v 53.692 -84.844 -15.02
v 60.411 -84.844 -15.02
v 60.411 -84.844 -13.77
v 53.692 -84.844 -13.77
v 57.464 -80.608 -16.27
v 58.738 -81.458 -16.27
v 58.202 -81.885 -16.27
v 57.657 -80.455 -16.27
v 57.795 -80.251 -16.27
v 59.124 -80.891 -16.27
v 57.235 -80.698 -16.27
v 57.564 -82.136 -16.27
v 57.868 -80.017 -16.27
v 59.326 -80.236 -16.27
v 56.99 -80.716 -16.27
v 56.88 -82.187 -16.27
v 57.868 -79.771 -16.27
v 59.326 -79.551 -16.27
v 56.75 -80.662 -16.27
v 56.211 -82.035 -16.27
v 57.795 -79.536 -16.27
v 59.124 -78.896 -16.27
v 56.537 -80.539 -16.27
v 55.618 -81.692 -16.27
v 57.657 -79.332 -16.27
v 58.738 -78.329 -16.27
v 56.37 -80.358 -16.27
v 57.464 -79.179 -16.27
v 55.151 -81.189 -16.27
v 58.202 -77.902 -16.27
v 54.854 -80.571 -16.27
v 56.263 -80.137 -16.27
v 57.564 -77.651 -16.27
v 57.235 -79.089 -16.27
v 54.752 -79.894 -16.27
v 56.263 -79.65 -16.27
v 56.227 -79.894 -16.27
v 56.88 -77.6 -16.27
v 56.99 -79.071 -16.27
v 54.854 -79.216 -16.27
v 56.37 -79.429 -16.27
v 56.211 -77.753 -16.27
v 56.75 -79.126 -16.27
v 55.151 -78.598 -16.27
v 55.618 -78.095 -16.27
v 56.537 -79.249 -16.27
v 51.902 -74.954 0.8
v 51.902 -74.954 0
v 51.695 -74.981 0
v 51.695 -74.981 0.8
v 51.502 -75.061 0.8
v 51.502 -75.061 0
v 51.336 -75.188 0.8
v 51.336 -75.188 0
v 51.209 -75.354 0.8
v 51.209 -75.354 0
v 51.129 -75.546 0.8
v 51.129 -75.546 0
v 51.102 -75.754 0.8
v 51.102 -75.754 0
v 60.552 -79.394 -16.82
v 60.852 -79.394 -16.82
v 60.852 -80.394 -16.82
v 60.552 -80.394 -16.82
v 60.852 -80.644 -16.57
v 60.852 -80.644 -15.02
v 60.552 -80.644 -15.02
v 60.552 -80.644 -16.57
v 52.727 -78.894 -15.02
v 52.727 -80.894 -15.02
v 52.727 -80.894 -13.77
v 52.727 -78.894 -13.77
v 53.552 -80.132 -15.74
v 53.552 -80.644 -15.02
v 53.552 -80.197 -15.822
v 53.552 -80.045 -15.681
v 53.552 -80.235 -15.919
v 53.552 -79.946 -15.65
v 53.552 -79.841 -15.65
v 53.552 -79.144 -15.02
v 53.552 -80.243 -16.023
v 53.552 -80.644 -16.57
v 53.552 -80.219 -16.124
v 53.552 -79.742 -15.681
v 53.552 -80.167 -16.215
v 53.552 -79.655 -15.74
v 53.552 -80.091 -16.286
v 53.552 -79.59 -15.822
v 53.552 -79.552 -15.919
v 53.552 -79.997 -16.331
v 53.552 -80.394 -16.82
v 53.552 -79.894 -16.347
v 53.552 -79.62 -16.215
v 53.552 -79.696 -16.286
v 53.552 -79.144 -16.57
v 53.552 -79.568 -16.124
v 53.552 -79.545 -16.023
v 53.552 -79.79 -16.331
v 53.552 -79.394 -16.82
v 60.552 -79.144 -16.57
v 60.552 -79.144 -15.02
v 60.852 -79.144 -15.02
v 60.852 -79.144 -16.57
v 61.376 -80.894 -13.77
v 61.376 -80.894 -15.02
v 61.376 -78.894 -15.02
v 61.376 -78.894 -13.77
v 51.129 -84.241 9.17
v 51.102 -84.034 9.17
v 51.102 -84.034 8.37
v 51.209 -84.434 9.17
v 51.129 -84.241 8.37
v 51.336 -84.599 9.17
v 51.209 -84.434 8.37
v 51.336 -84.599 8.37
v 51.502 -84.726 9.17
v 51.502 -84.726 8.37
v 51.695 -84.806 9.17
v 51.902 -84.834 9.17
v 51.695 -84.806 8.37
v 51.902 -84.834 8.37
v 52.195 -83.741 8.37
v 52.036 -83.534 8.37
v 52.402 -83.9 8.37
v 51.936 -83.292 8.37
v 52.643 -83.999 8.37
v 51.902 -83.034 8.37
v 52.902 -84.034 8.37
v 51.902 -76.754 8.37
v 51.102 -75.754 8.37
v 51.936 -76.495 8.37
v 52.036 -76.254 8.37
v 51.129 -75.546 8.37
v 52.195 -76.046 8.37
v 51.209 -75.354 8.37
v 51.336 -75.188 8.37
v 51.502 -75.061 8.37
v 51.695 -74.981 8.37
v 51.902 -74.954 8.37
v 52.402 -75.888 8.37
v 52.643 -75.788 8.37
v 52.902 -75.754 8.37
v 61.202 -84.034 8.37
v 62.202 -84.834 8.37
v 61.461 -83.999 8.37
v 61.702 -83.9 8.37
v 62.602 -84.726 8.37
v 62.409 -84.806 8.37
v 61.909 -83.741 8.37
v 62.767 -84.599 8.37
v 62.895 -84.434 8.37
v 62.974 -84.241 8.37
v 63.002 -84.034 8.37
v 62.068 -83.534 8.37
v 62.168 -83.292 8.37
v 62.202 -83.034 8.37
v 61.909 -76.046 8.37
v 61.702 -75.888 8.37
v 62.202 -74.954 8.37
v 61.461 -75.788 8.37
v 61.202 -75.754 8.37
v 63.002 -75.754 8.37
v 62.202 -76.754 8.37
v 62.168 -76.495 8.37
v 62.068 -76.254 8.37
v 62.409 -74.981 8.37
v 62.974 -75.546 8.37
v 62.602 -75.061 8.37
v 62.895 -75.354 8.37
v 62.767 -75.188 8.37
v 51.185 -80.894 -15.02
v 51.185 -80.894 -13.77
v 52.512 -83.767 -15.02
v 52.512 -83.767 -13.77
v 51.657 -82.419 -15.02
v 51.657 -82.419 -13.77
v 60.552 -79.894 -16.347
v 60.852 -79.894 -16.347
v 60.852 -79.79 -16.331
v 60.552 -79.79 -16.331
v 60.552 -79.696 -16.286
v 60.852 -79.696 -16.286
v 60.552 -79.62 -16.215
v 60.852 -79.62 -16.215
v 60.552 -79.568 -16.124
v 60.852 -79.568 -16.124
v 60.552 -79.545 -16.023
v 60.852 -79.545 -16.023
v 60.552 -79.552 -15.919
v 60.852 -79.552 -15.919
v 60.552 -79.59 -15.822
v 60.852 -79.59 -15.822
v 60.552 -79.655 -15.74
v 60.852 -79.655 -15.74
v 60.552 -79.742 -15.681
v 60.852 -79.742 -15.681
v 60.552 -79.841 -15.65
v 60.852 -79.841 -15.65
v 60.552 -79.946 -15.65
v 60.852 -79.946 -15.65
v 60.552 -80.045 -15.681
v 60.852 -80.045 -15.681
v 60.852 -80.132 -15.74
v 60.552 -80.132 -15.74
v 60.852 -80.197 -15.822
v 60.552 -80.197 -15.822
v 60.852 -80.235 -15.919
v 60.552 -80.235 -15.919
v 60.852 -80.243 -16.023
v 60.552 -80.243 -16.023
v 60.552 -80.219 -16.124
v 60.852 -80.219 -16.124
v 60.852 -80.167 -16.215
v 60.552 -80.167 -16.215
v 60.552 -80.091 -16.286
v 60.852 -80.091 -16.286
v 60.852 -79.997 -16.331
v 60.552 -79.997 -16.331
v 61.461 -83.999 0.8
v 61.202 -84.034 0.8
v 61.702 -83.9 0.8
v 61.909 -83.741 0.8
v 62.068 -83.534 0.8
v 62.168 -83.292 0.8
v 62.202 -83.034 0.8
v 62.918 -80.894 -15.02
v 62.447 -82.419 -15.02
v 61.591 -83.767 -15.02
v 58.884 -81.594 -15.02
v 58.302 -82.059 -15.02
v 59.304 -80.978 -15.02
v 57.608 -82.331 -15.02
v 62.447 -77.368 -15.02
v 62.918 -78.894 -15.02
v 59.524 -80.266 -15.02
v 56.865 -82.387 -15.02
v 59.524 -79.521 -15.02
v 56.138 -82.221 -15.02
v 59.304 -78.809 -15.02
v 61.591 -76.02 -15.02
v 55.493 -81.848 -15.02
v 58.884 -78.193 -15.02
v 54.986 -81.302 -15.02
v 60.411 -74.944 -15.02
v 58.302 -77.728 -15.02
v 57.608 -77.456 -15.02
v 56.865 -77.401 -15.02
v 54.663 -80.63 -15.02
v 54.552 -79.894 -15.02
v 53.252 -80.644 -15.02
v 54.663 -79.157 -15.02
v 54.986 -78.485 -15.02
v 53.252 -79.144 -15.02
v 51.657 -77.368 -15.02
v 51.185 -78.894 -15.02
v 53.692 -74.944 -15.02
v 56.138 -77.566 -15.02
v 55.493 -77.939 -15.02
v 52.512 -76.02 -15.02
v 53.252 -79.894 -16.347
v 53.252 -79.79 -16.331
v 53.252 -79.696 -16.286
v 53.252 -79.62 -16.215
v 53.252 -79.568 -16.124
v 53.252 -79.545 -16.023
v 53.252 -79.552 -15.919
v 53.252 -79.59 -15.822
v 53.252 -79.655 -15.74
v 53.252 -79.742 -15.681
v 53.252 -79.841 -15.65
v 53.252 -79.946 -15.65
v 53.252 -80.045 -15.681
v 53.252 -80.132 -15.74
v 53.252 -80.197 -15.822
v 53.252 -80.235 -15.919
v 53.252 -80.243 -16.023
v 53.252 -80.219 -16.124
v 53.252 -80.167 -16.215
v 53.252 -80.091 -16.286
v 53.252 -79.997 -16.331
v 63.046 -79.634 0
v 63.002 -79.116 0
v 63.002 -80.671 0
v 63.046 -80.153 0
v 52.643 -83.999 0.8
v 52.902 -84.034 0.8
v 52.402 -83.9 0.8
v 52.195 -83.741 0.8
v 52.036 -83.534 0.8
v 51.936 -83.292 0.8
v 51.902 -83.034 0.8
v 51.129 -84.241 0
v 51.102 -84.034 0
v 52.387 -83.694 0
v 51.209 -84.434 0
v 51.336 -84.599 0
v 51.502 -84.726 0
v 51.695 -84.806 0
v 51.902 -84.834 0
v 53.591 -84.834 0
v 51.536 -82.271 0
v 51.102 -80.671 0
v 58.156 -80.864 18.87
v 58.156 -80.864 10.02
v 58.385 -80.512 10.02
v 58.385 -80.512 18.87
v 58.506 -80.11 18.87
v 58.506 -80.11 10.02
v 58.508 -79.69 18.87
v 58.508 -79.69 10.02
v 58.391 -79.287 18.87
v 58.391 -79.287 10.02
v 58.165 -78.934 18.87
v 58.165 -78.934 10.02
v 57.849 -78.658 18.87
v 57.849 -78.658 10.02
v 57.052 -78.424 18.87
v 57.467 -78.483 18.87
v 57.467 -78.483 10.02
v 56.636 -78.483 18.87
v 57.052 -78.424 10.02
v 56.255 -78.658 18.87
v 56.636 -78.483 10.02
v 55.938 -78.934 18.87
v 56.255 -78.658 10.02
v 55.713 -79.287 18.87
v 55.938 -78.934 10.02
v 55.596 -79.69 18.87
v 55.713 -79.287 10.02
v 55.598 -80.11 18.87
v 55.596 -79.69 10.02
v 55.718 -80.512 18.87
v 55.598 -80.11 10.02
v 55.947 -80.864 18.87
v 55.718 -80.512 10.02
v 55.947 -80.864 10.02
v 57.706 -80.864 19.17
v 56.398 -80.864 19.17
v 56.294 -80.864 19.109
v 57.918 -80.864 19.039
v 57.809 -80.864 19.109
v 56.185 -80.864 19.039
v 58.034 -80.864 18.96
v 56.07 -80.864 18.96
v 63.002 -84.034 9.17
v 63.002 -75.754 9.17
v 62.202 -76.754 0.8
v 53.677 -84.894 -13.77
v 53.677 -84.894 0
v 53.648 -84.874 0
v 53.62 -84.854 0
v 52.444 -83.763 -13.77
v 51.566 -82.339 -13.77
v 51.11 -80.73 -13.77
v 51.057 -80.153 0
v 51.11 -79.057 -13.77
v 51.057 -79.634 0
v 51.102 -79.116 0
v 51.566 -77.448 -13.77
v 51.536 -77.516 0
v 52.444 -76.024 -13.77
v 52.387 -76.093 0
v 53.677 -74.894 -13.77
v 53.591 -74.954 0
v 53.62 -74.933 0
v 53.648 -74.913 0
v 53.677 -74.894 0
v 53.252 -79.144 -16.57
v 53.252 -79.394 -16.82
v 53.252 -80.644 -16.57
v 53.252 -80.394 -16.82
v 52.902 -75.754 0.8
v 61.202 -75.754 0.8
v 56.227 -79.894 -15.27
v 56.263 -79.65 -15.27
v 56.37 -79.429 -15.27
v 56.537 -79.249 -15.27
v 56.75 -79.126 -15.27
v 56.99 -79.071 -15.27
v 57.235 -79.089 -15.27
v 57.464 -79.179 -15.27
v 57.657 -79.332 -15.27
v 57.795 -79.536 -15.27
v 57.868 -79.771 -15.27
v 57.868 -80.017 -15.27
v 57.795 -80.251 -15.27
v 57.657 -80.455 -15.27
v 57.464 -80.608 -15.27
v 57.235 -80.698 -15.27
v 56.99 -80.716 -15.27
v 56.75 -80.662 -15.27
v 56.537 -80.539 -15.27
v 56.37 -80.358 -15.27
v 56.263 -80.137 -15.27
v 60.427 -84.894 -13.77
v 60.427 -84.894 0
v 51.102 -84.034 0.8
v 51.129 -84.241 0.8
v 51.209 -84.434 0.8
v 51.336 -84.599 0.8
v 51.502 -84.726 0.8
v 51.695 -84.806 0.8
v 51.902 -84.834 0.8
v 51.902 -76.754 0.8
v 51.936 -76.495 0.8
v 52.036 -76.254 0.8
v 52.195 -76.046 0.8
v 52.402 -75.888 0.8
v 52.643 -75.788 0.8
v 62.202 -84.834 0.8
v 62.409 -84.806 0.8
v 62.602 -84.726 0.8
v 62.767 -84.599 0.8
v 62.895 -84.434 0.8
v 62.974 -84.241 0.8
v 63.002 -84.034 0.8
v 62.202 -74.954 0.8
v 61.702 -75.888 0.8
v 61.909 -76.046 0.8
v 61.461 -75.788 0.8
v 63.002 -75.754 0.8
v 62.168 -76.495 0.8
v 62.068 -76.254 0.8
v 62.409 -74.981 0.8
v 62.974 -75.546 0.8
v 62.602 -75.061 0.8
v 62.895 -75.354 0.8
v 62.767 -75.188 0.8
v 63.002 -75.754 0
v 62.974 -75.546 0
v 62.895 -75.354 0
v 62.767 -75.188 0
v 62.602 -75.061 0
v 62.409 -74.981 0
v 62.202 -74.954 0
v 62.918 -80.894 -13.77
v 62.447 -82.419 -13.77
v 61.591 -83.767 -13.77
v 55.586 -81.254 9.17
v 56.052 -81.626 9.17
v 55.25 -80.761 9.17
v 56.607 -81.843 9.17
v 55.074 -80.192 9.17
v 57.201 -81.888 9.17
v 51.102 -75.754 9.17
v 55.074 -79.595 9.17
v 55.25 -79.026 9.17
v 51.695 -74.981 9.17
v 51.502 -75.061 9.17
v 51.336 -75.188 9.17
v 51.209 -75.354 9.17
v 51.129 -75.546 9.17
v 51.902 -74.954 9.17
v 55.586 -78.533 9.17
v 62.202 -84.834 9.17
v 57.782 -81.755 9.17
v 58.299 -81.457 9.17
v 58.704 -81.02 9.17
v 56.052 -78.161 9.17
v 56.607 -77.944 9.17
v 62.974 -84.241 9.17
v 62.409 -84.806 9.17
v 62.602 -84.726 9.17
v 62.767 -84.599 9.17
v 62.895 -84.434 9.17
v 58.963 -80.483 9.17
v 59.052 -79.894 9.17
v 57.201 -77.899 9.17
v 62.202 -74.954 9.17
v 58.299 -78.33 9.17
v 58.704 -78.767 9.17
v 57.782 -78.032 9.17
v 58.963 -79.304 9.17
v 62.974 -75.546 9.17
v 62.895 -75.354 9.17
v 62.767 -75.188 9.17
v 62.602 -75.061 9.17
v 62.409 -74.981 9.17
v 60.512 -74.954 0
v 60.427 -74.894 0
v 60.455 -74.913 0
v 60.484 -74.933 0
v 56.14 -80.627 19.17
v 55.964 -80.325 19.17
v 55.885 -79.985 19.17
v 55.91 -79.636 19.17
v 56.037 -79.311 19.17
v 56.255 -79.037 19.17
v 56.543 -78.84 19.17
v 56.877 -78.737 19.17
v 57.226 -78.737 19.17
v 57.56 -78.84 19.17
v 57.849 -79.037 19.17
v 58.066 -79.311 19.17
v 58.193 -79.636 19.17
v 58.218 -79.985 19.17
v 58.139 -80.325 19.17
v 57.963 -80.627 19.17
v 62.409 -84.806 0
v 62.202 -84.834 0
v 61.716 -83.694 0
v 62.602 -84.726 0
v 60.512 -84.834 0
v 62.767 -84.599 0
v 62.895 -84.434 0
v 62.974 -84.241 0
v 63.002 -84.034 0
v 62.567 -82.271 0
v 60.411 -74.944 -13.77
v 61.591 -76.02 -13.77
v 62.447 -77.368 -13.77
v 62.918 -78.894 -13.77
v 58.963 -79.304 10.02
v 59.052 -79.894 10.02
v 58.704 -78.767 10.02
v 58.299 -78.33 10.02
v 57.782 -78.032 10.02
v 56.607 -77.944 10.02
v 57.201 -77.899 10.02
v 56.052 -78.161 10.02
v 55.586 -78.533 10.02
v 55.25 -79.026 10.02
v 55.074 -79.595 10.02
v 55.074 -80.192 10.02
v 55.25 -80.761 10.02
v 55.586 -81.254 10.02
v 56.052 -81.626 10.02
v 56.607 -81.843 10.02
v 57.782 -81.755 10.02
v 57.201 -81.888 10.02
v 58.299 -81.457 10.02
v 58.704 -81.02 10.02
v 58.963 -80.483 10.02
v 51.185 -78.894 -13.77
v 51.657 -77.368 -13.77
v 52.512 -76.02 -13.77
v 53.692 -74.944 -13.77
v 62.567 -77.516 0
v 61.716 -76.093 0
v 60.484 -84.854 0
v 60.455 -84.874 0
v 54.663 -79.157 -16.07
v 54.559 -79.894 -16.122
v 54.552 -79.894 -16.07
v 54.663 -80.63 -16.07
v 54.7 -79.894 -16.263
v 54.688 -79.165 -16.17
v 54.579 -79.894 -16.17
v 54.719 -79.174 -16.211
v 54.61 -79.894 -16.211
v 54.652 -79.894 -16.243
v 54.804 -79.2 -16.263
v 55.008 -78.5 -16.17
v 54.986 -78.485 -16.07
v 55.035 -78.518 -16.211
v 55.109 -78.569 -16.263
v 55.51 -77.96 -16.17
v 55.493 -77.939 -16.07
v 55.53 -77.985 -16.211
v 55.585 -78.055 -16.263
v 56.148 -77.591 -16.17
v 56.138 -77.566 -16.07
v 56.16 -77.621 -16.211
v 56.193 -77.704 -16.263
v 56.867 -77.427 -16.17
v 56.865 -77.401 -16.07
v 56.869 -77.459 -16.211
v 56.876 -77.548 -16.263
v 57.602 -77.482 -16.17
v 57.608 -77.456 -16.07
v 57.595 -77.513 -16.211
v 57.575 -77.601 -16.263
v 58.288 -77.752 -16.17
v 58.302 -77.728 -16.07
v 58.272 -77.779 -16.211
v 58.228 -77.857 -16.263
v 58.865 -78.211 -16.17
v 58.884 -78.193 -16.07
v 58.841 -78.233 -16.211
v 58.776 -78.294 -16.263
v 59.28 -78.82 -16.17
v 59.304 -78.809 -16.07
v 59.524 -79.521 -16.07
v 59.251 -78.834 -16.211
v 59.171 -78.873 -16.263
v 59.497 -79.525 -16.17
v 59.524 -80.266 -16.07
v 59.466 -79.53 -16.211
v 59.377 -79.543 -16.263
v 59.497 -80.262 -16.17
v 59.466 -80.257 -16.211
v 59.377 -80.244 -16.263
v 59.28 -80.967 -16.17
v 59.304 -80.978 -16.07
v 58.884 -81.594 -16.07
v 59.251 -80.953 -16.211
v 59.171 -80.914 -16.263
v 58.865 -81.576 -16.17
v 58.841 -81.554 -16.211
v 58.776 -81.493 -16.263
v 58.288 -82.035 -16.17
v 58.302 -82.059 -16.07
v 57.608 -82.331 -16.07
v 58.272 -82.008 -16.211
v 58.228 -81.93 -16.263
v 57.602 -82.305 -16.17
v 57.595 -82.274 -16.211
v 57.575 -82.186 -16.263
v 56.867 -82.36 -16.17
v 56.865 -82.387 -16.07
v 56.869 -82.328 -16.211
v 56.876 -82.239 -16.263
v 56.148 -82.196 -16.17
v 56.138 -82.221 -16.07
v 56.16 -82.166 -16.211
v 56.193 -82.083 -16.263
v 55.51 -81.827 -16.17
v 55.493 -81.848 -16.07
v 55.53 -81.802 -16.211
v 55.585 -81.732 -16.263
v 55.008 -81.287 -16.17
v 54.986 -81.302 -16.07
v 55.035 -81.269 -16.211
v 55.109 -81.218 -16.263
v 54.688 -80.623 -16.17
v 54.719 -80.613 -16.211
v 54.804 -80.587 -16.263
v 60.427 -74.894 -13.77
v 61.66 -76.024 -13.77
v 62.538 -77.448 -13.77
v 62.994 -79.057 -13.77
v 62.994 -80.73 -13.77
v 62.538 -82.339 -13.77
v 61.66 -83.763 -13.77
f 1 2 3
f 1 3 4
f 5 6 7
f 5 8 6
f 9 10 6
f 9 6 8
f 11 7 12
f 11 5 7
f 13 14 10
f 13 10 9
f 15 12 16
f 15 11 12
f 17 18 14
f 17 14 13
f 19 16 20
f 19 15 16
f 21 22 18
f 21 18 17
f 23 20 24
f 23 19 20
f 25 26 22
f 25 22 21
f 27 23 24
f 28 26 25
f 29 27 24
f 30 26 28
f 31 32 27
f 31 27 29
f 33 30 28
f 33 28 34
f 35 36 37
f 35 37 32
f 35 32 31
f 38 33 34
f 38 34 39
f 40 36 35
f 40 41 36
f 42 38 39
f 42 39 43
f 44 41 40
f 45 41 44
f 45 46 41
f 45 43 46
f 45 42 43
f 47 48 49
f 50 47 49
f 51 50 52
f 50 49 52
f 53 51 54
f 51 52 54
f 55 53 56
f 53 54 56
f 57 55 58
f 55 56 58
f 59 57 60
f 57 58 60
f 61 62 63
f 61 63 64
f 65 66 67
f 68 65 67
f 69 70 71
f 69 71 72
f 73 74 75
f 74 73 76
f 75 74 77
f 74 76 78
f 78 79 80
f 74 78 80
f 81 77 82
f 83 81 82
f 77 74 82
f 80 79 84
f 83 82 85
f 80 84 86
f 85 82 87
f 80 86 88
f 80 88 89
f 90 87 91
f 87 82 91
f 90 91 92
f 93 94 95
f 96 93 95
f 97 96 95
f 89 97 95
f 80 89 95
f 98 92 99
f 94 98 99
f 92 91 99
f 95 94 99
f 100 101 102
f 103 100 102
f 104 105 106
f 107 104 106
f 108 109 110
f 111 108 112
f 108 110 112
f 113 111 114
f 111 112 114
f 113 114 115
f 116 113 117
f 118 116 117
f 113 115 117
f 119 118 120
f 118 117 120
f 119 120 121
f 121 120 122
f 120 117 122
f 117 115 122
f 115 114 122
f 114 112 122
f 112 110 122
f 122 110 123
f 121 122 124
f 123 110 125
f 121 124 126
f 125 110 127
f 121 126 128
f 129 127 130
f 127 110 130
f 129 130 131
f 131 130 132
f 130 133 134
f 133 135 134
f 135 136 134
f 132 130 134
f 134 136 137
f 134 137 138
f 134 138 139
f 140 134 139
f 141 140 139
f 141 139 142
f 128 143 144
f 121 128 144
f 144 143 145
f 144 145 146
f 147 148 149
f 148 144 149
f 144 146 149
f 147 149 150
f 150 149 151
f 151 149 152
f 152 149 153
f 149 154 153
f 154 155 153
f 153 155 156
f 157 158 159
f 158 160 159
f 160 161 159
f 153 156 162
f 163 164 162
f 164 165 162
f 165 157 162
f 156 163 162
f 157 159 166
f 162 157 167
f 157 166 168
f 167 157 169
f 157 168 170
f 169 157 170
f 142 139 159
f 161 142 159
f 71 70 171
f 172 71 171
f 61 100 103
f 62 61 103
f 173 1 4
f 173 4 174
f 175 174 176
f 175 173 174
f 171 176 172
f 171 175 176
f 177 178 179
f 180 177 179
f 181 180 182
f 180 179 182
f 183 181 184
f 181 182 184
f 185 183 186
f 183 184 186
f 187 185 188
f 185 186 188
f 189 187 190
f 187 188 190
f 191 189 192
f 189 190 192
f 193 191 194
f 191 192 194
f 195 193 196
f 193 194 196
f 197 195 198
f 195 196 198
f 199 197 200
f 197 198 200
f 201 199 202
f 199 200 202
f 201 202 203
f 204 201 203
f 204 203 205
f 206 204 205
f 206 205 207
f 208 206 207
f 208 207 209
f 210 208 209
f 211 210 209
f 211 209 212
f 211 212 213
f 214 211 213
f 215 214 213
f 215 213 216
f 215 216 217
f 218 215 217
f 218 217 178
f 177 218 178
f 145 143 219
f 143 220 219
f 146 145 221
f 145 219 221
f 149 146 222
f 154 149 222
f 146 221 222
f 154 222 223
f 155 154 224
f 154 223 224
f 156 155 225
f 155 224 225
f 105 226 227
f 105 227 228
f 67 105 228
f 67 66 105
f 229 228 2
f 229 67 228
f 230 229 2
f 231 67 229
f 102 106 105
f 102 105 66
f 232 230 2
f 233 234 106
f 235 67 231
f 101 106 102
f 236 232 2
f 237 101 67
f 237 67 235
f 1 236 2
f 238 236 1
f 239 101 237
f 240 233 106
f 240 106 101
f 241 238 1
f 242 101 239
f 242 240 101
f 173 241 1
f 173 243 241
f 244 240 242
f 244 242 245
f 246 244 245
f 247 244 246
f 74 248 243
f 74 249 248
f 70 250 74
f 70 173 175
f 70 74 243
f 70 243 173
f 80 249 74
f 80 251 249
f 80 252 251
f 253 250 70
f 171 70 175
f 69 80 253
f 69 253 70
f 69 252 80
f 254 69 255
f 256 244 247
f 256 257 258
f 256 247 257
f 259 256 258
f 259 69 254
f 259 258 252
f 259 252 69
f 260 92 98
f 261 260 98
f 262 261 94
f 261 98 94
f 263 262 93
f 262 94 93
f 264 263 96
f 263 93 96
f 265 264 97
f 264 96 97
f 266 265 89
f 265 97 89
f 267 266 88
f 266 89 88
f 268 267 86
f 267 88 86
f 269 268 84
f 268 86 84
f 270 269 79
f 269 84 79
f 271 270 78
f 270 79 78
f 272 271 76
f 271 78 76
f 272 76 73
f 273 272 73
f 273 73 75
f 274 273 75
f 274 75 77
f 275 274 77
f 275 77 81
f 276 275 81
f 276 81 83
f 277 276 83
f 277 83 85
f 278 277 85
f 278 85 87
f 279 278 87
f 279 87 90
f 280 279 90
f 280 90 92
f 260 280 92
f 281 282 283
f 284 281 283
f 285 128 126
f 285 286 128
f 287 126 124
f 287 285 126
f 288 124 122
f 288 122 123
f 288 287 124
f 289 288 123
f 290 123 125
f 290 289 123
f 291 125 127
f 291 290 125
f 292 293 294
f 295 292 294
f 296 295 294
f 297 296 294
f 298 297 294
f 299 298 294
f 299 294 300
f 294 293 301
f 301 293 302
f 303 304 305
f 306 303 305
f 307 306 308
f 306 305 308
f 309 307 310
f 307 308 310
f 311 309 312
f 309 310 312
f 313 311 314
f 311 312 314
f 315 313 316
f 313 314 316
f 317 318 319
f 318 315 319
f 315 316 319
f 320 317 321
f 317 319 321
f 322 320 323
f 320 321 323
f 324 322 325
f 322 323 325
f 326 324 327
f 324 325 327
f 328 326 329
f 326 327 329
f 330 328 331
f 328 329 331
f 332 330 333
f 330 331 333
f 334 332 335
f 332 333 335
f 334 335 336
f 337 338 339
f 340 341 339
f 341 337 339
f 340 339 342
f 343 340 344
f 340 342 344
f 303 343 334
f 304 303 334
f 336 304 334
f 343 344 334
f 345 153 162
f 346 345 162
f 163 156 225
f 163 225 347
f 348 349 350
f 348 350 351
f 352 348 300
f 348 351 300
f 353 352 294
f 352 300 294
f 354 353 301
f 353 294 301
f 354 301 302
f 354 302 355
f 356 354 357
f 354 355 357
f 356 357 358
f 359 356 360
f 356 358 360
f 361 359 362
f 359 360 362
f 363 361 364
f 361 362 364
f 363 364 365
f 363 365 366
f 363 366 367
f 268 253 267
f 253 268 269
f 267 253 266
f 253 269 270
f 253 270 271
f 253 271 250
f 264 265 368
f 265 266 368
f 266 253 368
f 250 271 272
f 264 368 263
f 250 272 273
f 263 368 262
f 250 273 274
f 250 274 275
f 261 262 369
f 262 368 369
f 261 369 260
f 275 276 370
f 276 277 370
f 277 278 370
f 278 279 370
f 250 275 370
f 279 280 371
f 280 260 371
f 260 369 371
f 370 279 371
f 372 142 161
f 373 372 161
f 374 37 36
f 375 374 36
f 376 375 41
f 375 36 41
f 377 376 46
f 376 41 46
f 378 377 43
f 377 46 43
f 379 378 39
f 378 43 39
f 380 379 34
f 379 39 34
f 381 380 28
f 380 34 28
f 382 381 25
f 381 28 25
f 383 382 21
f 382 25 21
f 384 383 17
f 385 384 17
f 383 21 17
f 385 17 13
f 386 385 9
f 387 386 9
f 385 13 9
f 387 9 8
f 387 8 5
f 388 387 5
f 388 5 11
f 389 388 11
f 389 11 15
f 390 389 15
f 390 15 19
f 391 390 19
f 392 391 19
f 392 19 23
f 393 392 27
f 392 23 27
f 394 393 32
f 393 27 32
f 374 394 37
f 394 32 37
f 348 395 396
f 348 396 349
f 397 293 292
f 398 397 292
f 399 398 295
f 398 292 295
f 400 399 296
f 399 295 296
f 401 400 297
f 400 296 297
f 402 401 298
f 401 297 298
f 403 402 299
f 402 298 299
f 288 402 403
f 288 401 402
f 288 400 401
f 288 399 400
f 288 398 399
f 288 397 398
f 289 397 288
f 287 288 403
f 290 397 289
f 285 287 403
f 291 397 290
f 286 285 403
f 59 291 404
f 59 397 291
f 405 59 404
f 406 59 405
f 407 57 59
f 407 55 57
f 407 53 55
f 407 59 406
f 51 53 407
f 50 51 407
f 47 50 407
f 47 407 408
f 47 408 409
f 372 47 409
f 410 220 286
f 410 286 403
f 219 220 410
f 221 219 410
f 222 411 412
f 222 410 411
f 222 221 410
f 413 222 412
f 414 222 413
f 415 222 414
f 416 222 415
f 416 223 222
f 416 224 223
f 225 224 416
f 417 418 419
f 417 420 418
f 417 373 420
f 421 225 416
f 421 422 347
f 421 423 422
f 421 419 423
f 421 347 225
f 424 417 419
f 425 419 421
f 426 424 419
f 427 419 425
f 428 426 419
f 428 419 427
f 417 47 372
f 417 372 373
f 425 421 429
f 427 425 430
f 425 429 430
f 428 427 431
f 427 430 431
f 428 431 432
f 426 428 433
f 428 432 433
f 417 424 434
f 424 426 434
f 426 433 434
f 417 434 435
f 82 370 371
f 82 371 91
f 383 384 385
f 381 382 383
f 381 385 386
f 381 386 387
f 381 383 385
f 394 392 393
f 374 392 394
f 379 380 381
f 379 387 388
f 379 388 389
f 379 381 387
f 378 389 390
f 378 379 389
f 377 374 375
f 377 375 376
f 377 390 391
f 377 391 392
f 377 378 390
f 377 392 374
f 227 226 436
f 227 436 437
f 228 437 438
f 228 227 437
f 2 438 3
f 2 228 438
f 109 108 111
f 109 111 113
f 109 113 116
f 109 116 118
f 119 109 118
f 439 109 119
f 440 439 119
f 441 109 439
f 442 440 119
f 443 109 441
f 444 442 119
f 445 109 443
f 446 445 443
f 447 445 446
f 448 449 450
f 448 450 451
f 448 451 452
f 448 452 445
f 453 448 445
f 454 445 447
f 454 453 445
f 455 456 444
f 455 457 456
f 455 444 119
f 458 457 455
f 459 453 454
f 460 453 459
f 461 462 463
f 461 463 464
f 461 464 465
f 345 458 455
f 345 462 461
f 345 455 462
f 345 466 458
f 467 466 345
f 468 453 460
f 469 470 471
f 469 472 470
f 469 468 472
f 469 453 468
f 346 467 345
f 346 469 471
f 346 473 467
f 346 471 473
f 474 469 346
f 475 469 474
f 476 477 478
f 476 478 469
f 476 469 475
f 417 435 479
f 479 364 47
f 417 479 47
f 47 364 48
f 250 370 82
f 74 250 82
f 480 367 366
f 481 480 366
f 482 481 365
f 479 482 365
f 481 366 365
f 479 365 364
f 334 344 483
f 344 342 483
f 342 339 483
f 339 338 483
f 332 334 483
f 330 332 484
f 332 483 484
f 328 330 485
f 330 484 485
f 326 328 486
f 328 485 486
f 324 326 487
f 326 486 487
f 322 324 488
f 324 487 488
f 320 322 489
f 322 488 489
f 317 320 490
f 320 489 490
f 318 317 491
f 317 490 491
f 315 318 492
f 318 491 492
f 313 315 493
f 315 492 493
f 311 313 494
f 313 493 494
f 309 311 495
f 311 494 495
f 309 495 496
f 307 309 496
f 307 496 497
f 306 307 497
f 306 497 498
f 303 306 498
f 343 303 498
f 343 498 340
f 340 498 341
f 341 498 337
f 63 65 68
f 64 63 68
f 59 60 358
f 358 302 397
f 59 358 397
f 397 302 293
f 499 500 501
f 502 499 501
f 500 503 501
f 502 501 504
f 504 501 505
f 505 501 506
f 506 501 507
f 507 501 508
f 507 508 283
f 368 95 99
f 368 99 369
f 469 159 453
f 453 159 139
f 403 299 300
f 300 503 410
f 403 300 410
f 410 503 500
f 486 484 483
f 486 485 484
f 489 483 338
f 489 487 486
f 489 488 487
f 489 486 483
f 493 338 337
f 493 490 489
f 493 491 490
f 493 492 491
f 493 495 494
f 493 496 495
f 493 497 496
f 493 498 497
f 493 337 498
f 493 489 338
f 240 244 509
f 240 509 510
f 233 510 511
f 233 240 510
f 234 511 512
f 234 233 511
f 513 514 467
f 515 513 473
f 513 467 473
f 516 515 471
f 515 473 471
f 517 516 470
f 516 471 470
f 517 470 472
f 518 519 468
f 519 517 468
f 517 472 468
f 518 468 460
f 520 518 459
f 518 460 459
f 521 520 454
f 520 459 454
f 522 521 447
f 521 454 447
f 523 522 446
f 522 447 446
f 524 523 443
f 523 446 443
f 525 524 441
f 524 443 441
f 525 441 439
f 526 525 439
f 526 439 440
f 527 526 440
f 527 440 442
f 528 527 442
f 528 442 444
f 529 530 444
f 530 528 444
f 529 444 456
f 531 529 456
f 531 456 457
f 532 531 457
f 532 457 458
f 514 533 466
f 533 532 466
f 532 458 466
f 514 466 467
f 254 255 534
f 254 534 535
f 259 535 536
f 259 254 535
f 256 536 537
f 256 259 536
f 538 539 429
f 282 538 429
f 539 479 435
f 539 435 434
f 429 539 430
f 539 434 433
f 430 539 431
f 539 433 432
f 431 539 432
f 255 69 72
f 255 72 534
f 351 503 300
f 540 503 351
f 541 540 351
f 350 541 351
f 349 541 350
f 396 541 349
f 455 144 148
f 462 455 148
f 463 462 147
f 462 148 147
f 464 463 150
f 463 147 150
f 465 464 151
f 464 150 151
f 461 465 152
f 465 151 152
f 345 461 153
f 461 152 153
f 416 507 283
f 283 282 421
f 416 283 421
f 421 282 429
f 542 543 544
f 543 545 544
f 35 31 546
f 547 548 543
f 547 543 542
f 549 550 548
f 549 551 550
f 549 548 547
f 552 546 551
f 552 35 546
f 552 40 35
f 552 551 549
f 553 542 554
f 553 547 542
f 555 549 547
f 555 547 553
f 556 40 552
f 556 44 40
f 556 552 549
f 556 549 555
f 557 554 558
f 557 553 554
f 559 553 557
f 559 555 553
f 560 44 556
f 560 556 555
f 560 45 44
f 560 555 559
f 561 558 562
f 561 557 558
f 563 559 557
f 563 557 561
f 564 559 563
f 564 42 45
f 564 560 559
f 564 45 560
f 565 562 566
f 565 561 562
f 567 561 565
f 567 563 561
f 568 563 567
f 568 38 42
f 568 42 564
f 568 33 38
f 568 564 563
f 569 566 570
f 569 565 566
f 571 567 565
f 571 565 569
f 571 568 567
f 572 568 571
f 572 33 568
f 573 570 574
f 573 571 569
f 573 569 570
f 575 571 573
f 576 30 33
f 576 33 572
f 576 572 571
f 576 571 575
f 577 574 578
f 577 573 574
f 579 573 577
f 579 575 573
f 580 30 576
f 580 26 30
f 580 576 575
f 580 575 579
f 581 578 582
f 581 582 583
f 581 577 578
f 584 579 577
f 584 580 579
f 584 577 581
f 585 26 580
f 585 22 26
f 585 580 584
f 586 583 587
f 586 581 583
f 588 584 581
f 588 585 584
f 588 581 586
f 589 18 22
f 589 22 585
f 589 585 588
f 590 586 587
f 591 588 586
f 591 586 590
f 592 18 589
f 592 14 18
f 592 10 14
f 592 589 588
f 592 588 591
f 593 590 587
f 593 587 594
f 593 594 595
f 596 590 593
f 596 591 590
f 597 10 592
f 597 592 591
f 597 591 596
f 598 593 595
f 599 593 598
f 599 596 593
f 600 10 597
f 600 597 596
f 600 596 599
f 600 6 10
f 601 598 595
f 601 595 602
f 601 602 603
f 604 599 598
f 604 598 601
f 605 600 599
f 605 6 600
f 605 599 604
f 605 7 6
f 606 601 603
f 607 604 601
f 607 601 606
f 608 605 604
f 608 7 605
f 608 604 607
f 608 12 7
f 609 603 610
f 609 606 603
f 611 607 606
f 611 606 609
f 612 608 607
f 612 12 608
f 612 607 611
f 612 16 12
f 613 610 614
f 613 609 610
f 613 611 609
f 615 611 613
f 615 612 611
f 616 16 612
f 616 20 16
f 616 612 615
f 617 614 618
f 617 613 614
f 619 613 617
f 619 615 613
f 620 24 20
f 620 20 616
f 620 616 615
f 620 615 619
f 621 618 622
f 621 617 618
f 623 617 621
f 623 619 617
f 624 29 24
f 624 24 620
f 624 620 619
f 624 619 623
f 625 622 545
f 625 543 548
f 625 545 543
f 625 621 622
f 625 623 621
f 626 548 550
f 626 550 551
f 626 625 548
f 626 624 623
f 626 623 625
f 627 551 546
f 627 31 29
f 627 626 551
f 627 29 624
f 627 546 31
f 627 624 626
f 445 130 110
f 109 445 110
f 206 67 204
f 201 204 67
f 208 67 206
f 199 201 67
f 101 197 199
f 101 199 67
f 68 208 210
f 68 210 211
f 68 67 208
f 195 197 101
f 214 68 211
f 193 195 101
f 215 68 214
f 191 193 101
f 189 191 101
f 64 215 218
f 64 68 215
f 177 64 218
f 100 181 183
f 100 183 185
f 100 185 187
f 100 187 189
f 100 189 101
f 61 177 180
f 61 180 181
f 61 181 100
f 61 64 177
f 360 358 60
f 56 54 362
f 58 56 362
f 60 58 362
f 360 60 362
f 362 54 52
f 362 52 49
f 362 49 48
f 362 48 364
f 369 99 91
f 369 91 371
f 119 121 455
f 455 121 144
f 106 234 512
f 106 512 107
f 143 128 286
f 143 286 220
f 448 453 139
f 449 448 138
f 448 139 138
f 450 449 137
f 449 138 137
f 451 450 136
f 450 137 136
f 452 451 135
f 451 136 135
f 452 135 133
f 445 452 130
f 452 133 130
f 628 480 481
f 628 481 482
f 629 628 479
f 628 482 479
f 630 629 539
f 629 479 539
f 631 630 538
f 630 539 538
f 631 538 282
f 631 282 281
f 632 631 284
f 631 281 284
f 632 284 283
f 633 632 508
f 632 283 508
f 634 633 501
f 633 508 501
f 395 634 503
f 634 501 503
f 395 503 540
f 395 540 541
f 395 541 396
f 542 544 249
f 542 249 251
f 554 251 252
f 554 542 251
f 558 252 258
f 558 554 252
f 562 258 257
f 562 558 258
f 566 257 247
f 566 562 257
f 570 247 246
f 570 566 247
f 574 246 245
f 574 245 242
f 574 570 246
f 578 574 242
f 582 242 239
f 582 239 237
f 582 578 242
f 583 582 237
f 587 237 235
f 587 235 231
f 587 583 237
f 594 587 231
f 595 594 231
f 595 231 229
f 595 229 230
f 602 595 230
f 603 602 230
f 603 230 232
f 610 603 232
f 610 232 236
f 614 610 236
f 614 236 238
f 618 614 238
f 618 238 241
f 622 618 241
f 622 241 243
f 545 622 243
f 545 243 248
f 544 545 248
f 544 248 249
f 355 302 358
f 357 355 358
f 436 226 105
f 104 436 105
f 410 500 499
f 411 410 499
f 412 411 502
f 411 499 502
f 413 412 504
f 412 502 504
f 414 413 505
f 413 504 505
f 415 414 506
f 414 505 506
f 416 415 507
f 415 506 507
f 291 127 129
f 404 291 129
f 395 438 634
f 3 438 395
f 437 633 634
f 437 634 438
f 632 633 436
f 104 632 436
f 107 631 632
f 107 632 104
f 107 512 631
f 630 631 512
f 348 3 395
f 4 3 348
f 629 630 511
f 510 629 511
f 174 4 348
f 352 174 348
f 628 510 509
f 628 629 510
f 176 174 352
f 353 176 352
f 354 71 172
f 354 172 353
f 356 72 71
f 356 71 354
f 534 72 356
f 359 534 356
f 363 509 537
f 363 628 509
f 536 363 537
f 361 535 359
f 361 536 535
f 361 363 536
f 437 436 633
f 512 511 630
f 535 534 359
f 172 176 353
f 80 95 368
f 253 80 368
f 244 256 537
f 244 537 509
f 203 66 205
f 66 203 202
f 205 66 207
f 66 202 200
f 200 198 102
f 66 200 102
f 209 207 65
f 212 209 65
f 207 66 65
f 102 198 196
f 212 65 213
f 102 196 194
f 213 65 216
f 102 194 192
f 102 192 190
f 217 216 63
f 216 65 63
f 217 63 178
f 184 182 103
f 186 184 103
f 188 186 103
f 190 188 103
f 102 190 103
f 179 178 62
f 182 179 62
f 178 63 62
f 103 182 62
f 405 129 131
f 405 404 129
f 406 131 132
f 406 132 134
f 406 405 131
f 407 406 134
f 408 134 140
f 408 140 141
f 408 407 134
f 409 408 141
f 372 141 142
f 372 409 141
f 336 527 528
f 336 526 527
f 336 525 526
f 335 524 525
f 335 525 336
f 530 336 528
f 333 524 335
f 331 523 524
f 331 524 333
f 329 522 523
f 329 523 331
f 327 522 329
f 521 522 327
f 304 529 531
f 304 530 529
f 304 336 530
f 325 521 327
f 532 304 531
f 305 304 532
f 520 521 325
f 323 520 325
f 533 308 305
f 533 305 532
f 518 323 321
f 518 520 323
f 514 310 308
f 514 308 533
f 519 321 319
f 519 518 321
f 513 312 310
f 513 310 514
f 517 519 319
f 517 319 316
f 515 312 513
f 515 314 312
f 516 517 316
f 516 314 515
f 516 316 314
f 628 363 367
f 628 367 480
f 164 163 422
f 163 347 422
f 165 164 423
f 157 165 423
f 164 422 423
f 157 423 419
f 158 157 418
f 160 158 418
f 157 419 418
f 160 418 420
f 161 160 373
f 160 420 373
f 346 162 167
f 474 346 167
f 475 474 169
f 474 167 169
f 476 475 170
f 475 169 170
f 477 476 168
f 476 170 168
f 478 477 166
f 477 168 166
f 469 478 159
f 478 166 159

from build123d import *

# Parameters (mm, degrees)
BOSS_EXTRUDE1_DEPTH = 16.82
BOSS_EXTRUDE2_DEPTH = 9.17
SKETCH3_R           = 2
BOSS_EXTRUDE3_DEPTH = 0.85
SKETCH4_R           = 1.47
BOSS_EXTRUDE4_DEPTH = 9.15
CUT_EXTRUDE1_DEPTH  = 9.15
SKETCH7_R           = 7.076677912
SKETCH7_R_2         = 2.5
CUT_EXTRUDE2_DEPTH  = 1.8
SKETCH8_R           = 2.5
CUT_EXTRUDE3_DEPTH  = 0.55
SKETCH9_W           = 14.3
SKETCH9_H           = 12.28
SKETCH9_W_2         = 10.3
SKETCH9_H_2         = 8.28
CUT_EXTRUDE4_DEPTH  = 7.57
FILLET1_R           = 1
CHAMFER2_SIZE       = 0.25
SKETCH10_R          = 0.35
CUT_EXTRUDE5_DEPTH  = 0.8
SKETCH11_R          = 0.35
CUT_EXTRUDE6_DEPTH  = 0.8
FILLET2_R           = 0.2
SKETCH12_R          = 0.825
CUT_EXTRUDE7_DEPTH  = 1
CUT_EXTRUDE8_DEPTH  = 1.25
SKETCH14_W          = 1.939968983
SKETCH14_H          = 2
CUT_EXTRUDE9_DEPTH  = 1.25
CHAMFER3_SIZE       = 0.3


with BuildPart() as part:
    # Sketch1 → Boss-Extrude1 (new body)
    with BuildSketch(Plane.XY):
        with BuildLine():
            Line((53.676749567, -74.893540286), (60.426749567, -74.893540286))
            ThreePointArc((60.426749567, -74.893540286), (63.051749567, -79.893540286), (60.426749567, -84.893540286))
            Line((60.426749567, -84.893540286), (53.676749567, -84.893540286))
            ThreePointArc((53.676749567, -84.893540286), (51.051749567, -79.893540286), (53.676749567, -74.893540286))
        make_face()
    extrude(amount=-BOSS_EXTRUDE1_DEPTH)

    # Sketch2 → Boss-Extrude2 (add)
    with BuildSketch(Plane.XY):
        with BuildLine():
            Line((63.001749567, -84.033540286), (63.001749567, -75.753540286))
            ThreePointArc((63.001749567, -75.753540286), (62.767434992, -75.187854862), (62.201749567, -74.953540286))
            Line((62.201749567, -74.953540286), (51.901749567, -74.953540286))
            ThreePointArc((51.901749567, -74.953540286), (51.336064142, -75.187854862), (51.101749567, -75.753540286))
            Line((51.101749567, -75.753540286), (51.101749567, -84.033540286))
            ThreePointArc((51.101749567, -84.033540286), (51.336064142, -84.599225711), (51.901749567, -84.833540286))
            Line((51.901749567, -84.833540286), (62.201749567, -84.833540286))
            ThreePointArc((62.201749567, -84.833540286), (62.767434992, -84.599225711), (63.001749567, -84.033540286))
        make_face()
    extrude(amount=BOSS_EXTRUDE2_DEPTH)

    # Sketch3 → Boss-Extrude3 (add)
    with BuildSketch(Plane.XY.offset(9.17)):
        with Locations((57.051749567, -79.893540286)):
            Circle(SKETCH3_R)
    extrude(amount=BOSS_EXTRUDE3_DEPTH)

    # Sketch4 → Boss-Extrude4 (add)
    with BuildSketch(Plane.XY.offset(10.02)):
        with Locations((57.051749567, -79.893540286)):
            Circle(SKETCH4_R)
    extrude(amount=BOSS_EXTRUDE4_DEPTH)

    # Sketch5 → Cut-Extrude1 (cut)
    with BuildSketch(Plane.XY.offset(19.17)):
        Polygon((57.051749567, -80.863540286), (58.479364881, -80.863540286), (58.479364881, -81.63553805), (55.371975477, -81.63553805), (55.371975477, -80.863540286), align=None)
    extrude(amount=-CUT_EXTRUDE1_DEPTH, mode=Mode.SUBTRACT)

    # Sketch7 → Cut-Extrude2 (cut)
    with BuildSketch(Plane(origin=(0, 0, -16.82), x_dir=(-1, 0, 0), z_dir=(0, 0, -1))):
        with Locations((-57.051749567, -79.893540286)):
            Circle(SKETCH7_R)
        with Locations((-57.051749567, -79.893540286)):
            Circle(SKETCH7_R_2, mode=Mode.SUBTRACT)
        Polygon((-60.551749567, -79.143540286), (-60.851749567, -79.143540286), (-60.851749567, -79.893540286), (-60.851749567, -80.643540286), (-60.551749567, -80.643540286), align=None, mode=Mode.SUBTRACT)
        Polygon((-53.251749567, -79.143540286), (-53.251749567, -79.893540286), (-53.251749567, -80.643540286), (-53.551749567, -80.643540286), (-53.551749567, -79.143540286), align=None, mode=Mode.SUBTRACT)
    extrude(amount=-CUT_EXTRUDE2_DEPTH, mode=Mode.SUBTRACT)

    # Sketch8 → Cut-Extrude3 (cut)
    with BuildSketch(Plane(origin=(0, 0, -16.82), x_dir=(-1, 0, 0), z_dir=(0, 0, -1))):
        with Locations((-57.051749567, -79.893540286)):
            Circle(SKETCH8_R)
    extrude(amount=-CUT_EXTRUDE3_DEPTH, mode=Mode.SUBTRACT)

    # Sketch9 → Cut-Extrude4 (cut)
    with BuildSketch(Plane.XY.offset(8.37)):
        with Locations((57.051749567, -79.893540286)):
            Rectangle(SKETCH9_W, SKETCH9_H)
        with Locations((57.051749567, -79.893540286)):
            Rectangle(SKETCH9_W_2, SKETCH9_H_2, mode=Mode.SUBTRACT)
    extrude(amount=-CUT_EXTRUDE4_DEPTH, mode=Mode.SUBTRACT)

    # Fillet1
    fillet1_edges = [part.edges().sort_by_distance(p)[0] for p in [
        (51.901749567, -75.753540286, 4.585),
        (51.901749567, -84.033540286, 4.585),
        (62.201749567, -84.033540286, 4.585),
        (62.201749567, -75.753540286, 4.585),
    ]]
    fillet(fillet1_edges, radius=FILLET1_R)

    # Chamfer2
    chamfer2_edges = [part.edges().sort_by_distance(p)[0] for p in [
        (60.701749567, -80.643540286, -16.82),
        (60.701749567, -79.143540286, -16.82),
        (53.401749567, -80.643540286, -16.82),
        (53.401749567, -79.143540286, -16.82),
    ]]
    chamfer(chamfer2_edges, length=CHAMFER2_SIZE)

    # Sketch10 → Cut-Extrude5 (cut)
    with BuildSketch(Plane(origin=(60.851749567, 0, 0), x_dir=(0, 0, -1), z_dir=(1, 0, 0))):
        with Locations((15.996548304, -79.893540286)):
            Circle(SKETCH10_R)
    extrude(amount=-CUT_EXTRUDE5_DEPTH, mode=Mode.SUBTRACT)

    # Sketch11 → Cut-Extrude6 (cut)
    with BuildSketch(Plane(origin=(53.551749567, 0, 0), x_dir=(0, 0, -1), z_dir=(1, 0, 0))):
        with Locations((15.996548304, -79.893540286)):
            Circle(SKETCH11_R)
    extrude(amount=-CUT_EXTRUDE6_DEPTH, mode=Mode.SUBTRACT)

    # Fillet2
    fillet2_edges = [part.edges().sort_by_distance(p)[0] for p in [
        (59.551749567, -79.893540286, -16.27),
    ]]
    fillet(fillet2_edges, radius=FILLET2_R)

    # Sketch12 → Cut-Extrude7 (cut)
    with BuildSketch(Plane(origin=(0, 0, -16.27), x_dir=(-1, 0, 0), z_dir=(0, 0, -1))):
        with Locations((-57.051749567, -79.893540286)):
            Circle(SKETCH12_R)
    extrude(amount=-CUT_EXTRUDE7_DEPTH, mode=Mode.SUBTRACT)

    # Sketch13 → Cut-Extrude8 (cut)
    with BuildSketch(Plane(origin=(0, 0, -15.02), x_dir=(-1, 0, 0), z_dir=(0, 0, -1))):
        with BuildLine():
            Line((-53.392555226, -73.943540286), (-60.710943907, -73.943540286))
            ThreePointArc((-60.710943907, -73.943540286), (-64.001749567, -79.893540286), (-60.710943907, -85.843540286))
            Line((-60.710943907, -85.843540286), (-53.392555226, -85.843540286))
            ThreePointArc((-53.392555226, -85.843540286), (-50.101749567, -79.893540286), (-53.392555226, -73.943540286))
        make_face()
        with BuildLine():
            Line((-53.692358654, -74.943540286), (-60.411140479, -74.943540286))
            ThreePointArc((-60.411140479, -74.943540286), (-63.001749567, -79.893540286), (-60.411140479, -84.843540286))
            Line((-60.411140479, -84.843540286), (-53.692358654, -84.843540286))
            ThreePointArc((-53.692358654, -84.843540286), (-51.101749567, -79.893540286), (-53.692358654, -74.943540286))
        make_face(mode=Mode.SUBTRACT)
    extrude(amount=-CUT_EXTRUDE8_DEPTH, mode=Mode.SUBTRACT)

    # Sketch14 → Cut-Extrude9 (cut)
    with BuildSketch(Plane(origin=(0, 0, -15.02), x_dir=(-1, 0, 0), z_dir=(0, 0, -1))):
        with Locations((-62.346150018, -79.893540286)):
            Rectangle(SKETCH14_W, SKETCH14_H)
        with Locations((-51.757349116, -79.893540286)):
            Rectangle(SKETCH14_W, SKETCH14_H)
    extrude(amount=-CUT_EXTRUDE9_DEPTH, mode=Mode.SUBTRACT)

    # Chamfer3
    chamfer3_edges = [part.edges().sort_by_distance(p)[0] for p in [
        (57.051749567, -78.423540286, 19.17),
    ]]
    chamfer(chamfer3_edges, length=CHAMFER3_SIZE)


solid = part.part
